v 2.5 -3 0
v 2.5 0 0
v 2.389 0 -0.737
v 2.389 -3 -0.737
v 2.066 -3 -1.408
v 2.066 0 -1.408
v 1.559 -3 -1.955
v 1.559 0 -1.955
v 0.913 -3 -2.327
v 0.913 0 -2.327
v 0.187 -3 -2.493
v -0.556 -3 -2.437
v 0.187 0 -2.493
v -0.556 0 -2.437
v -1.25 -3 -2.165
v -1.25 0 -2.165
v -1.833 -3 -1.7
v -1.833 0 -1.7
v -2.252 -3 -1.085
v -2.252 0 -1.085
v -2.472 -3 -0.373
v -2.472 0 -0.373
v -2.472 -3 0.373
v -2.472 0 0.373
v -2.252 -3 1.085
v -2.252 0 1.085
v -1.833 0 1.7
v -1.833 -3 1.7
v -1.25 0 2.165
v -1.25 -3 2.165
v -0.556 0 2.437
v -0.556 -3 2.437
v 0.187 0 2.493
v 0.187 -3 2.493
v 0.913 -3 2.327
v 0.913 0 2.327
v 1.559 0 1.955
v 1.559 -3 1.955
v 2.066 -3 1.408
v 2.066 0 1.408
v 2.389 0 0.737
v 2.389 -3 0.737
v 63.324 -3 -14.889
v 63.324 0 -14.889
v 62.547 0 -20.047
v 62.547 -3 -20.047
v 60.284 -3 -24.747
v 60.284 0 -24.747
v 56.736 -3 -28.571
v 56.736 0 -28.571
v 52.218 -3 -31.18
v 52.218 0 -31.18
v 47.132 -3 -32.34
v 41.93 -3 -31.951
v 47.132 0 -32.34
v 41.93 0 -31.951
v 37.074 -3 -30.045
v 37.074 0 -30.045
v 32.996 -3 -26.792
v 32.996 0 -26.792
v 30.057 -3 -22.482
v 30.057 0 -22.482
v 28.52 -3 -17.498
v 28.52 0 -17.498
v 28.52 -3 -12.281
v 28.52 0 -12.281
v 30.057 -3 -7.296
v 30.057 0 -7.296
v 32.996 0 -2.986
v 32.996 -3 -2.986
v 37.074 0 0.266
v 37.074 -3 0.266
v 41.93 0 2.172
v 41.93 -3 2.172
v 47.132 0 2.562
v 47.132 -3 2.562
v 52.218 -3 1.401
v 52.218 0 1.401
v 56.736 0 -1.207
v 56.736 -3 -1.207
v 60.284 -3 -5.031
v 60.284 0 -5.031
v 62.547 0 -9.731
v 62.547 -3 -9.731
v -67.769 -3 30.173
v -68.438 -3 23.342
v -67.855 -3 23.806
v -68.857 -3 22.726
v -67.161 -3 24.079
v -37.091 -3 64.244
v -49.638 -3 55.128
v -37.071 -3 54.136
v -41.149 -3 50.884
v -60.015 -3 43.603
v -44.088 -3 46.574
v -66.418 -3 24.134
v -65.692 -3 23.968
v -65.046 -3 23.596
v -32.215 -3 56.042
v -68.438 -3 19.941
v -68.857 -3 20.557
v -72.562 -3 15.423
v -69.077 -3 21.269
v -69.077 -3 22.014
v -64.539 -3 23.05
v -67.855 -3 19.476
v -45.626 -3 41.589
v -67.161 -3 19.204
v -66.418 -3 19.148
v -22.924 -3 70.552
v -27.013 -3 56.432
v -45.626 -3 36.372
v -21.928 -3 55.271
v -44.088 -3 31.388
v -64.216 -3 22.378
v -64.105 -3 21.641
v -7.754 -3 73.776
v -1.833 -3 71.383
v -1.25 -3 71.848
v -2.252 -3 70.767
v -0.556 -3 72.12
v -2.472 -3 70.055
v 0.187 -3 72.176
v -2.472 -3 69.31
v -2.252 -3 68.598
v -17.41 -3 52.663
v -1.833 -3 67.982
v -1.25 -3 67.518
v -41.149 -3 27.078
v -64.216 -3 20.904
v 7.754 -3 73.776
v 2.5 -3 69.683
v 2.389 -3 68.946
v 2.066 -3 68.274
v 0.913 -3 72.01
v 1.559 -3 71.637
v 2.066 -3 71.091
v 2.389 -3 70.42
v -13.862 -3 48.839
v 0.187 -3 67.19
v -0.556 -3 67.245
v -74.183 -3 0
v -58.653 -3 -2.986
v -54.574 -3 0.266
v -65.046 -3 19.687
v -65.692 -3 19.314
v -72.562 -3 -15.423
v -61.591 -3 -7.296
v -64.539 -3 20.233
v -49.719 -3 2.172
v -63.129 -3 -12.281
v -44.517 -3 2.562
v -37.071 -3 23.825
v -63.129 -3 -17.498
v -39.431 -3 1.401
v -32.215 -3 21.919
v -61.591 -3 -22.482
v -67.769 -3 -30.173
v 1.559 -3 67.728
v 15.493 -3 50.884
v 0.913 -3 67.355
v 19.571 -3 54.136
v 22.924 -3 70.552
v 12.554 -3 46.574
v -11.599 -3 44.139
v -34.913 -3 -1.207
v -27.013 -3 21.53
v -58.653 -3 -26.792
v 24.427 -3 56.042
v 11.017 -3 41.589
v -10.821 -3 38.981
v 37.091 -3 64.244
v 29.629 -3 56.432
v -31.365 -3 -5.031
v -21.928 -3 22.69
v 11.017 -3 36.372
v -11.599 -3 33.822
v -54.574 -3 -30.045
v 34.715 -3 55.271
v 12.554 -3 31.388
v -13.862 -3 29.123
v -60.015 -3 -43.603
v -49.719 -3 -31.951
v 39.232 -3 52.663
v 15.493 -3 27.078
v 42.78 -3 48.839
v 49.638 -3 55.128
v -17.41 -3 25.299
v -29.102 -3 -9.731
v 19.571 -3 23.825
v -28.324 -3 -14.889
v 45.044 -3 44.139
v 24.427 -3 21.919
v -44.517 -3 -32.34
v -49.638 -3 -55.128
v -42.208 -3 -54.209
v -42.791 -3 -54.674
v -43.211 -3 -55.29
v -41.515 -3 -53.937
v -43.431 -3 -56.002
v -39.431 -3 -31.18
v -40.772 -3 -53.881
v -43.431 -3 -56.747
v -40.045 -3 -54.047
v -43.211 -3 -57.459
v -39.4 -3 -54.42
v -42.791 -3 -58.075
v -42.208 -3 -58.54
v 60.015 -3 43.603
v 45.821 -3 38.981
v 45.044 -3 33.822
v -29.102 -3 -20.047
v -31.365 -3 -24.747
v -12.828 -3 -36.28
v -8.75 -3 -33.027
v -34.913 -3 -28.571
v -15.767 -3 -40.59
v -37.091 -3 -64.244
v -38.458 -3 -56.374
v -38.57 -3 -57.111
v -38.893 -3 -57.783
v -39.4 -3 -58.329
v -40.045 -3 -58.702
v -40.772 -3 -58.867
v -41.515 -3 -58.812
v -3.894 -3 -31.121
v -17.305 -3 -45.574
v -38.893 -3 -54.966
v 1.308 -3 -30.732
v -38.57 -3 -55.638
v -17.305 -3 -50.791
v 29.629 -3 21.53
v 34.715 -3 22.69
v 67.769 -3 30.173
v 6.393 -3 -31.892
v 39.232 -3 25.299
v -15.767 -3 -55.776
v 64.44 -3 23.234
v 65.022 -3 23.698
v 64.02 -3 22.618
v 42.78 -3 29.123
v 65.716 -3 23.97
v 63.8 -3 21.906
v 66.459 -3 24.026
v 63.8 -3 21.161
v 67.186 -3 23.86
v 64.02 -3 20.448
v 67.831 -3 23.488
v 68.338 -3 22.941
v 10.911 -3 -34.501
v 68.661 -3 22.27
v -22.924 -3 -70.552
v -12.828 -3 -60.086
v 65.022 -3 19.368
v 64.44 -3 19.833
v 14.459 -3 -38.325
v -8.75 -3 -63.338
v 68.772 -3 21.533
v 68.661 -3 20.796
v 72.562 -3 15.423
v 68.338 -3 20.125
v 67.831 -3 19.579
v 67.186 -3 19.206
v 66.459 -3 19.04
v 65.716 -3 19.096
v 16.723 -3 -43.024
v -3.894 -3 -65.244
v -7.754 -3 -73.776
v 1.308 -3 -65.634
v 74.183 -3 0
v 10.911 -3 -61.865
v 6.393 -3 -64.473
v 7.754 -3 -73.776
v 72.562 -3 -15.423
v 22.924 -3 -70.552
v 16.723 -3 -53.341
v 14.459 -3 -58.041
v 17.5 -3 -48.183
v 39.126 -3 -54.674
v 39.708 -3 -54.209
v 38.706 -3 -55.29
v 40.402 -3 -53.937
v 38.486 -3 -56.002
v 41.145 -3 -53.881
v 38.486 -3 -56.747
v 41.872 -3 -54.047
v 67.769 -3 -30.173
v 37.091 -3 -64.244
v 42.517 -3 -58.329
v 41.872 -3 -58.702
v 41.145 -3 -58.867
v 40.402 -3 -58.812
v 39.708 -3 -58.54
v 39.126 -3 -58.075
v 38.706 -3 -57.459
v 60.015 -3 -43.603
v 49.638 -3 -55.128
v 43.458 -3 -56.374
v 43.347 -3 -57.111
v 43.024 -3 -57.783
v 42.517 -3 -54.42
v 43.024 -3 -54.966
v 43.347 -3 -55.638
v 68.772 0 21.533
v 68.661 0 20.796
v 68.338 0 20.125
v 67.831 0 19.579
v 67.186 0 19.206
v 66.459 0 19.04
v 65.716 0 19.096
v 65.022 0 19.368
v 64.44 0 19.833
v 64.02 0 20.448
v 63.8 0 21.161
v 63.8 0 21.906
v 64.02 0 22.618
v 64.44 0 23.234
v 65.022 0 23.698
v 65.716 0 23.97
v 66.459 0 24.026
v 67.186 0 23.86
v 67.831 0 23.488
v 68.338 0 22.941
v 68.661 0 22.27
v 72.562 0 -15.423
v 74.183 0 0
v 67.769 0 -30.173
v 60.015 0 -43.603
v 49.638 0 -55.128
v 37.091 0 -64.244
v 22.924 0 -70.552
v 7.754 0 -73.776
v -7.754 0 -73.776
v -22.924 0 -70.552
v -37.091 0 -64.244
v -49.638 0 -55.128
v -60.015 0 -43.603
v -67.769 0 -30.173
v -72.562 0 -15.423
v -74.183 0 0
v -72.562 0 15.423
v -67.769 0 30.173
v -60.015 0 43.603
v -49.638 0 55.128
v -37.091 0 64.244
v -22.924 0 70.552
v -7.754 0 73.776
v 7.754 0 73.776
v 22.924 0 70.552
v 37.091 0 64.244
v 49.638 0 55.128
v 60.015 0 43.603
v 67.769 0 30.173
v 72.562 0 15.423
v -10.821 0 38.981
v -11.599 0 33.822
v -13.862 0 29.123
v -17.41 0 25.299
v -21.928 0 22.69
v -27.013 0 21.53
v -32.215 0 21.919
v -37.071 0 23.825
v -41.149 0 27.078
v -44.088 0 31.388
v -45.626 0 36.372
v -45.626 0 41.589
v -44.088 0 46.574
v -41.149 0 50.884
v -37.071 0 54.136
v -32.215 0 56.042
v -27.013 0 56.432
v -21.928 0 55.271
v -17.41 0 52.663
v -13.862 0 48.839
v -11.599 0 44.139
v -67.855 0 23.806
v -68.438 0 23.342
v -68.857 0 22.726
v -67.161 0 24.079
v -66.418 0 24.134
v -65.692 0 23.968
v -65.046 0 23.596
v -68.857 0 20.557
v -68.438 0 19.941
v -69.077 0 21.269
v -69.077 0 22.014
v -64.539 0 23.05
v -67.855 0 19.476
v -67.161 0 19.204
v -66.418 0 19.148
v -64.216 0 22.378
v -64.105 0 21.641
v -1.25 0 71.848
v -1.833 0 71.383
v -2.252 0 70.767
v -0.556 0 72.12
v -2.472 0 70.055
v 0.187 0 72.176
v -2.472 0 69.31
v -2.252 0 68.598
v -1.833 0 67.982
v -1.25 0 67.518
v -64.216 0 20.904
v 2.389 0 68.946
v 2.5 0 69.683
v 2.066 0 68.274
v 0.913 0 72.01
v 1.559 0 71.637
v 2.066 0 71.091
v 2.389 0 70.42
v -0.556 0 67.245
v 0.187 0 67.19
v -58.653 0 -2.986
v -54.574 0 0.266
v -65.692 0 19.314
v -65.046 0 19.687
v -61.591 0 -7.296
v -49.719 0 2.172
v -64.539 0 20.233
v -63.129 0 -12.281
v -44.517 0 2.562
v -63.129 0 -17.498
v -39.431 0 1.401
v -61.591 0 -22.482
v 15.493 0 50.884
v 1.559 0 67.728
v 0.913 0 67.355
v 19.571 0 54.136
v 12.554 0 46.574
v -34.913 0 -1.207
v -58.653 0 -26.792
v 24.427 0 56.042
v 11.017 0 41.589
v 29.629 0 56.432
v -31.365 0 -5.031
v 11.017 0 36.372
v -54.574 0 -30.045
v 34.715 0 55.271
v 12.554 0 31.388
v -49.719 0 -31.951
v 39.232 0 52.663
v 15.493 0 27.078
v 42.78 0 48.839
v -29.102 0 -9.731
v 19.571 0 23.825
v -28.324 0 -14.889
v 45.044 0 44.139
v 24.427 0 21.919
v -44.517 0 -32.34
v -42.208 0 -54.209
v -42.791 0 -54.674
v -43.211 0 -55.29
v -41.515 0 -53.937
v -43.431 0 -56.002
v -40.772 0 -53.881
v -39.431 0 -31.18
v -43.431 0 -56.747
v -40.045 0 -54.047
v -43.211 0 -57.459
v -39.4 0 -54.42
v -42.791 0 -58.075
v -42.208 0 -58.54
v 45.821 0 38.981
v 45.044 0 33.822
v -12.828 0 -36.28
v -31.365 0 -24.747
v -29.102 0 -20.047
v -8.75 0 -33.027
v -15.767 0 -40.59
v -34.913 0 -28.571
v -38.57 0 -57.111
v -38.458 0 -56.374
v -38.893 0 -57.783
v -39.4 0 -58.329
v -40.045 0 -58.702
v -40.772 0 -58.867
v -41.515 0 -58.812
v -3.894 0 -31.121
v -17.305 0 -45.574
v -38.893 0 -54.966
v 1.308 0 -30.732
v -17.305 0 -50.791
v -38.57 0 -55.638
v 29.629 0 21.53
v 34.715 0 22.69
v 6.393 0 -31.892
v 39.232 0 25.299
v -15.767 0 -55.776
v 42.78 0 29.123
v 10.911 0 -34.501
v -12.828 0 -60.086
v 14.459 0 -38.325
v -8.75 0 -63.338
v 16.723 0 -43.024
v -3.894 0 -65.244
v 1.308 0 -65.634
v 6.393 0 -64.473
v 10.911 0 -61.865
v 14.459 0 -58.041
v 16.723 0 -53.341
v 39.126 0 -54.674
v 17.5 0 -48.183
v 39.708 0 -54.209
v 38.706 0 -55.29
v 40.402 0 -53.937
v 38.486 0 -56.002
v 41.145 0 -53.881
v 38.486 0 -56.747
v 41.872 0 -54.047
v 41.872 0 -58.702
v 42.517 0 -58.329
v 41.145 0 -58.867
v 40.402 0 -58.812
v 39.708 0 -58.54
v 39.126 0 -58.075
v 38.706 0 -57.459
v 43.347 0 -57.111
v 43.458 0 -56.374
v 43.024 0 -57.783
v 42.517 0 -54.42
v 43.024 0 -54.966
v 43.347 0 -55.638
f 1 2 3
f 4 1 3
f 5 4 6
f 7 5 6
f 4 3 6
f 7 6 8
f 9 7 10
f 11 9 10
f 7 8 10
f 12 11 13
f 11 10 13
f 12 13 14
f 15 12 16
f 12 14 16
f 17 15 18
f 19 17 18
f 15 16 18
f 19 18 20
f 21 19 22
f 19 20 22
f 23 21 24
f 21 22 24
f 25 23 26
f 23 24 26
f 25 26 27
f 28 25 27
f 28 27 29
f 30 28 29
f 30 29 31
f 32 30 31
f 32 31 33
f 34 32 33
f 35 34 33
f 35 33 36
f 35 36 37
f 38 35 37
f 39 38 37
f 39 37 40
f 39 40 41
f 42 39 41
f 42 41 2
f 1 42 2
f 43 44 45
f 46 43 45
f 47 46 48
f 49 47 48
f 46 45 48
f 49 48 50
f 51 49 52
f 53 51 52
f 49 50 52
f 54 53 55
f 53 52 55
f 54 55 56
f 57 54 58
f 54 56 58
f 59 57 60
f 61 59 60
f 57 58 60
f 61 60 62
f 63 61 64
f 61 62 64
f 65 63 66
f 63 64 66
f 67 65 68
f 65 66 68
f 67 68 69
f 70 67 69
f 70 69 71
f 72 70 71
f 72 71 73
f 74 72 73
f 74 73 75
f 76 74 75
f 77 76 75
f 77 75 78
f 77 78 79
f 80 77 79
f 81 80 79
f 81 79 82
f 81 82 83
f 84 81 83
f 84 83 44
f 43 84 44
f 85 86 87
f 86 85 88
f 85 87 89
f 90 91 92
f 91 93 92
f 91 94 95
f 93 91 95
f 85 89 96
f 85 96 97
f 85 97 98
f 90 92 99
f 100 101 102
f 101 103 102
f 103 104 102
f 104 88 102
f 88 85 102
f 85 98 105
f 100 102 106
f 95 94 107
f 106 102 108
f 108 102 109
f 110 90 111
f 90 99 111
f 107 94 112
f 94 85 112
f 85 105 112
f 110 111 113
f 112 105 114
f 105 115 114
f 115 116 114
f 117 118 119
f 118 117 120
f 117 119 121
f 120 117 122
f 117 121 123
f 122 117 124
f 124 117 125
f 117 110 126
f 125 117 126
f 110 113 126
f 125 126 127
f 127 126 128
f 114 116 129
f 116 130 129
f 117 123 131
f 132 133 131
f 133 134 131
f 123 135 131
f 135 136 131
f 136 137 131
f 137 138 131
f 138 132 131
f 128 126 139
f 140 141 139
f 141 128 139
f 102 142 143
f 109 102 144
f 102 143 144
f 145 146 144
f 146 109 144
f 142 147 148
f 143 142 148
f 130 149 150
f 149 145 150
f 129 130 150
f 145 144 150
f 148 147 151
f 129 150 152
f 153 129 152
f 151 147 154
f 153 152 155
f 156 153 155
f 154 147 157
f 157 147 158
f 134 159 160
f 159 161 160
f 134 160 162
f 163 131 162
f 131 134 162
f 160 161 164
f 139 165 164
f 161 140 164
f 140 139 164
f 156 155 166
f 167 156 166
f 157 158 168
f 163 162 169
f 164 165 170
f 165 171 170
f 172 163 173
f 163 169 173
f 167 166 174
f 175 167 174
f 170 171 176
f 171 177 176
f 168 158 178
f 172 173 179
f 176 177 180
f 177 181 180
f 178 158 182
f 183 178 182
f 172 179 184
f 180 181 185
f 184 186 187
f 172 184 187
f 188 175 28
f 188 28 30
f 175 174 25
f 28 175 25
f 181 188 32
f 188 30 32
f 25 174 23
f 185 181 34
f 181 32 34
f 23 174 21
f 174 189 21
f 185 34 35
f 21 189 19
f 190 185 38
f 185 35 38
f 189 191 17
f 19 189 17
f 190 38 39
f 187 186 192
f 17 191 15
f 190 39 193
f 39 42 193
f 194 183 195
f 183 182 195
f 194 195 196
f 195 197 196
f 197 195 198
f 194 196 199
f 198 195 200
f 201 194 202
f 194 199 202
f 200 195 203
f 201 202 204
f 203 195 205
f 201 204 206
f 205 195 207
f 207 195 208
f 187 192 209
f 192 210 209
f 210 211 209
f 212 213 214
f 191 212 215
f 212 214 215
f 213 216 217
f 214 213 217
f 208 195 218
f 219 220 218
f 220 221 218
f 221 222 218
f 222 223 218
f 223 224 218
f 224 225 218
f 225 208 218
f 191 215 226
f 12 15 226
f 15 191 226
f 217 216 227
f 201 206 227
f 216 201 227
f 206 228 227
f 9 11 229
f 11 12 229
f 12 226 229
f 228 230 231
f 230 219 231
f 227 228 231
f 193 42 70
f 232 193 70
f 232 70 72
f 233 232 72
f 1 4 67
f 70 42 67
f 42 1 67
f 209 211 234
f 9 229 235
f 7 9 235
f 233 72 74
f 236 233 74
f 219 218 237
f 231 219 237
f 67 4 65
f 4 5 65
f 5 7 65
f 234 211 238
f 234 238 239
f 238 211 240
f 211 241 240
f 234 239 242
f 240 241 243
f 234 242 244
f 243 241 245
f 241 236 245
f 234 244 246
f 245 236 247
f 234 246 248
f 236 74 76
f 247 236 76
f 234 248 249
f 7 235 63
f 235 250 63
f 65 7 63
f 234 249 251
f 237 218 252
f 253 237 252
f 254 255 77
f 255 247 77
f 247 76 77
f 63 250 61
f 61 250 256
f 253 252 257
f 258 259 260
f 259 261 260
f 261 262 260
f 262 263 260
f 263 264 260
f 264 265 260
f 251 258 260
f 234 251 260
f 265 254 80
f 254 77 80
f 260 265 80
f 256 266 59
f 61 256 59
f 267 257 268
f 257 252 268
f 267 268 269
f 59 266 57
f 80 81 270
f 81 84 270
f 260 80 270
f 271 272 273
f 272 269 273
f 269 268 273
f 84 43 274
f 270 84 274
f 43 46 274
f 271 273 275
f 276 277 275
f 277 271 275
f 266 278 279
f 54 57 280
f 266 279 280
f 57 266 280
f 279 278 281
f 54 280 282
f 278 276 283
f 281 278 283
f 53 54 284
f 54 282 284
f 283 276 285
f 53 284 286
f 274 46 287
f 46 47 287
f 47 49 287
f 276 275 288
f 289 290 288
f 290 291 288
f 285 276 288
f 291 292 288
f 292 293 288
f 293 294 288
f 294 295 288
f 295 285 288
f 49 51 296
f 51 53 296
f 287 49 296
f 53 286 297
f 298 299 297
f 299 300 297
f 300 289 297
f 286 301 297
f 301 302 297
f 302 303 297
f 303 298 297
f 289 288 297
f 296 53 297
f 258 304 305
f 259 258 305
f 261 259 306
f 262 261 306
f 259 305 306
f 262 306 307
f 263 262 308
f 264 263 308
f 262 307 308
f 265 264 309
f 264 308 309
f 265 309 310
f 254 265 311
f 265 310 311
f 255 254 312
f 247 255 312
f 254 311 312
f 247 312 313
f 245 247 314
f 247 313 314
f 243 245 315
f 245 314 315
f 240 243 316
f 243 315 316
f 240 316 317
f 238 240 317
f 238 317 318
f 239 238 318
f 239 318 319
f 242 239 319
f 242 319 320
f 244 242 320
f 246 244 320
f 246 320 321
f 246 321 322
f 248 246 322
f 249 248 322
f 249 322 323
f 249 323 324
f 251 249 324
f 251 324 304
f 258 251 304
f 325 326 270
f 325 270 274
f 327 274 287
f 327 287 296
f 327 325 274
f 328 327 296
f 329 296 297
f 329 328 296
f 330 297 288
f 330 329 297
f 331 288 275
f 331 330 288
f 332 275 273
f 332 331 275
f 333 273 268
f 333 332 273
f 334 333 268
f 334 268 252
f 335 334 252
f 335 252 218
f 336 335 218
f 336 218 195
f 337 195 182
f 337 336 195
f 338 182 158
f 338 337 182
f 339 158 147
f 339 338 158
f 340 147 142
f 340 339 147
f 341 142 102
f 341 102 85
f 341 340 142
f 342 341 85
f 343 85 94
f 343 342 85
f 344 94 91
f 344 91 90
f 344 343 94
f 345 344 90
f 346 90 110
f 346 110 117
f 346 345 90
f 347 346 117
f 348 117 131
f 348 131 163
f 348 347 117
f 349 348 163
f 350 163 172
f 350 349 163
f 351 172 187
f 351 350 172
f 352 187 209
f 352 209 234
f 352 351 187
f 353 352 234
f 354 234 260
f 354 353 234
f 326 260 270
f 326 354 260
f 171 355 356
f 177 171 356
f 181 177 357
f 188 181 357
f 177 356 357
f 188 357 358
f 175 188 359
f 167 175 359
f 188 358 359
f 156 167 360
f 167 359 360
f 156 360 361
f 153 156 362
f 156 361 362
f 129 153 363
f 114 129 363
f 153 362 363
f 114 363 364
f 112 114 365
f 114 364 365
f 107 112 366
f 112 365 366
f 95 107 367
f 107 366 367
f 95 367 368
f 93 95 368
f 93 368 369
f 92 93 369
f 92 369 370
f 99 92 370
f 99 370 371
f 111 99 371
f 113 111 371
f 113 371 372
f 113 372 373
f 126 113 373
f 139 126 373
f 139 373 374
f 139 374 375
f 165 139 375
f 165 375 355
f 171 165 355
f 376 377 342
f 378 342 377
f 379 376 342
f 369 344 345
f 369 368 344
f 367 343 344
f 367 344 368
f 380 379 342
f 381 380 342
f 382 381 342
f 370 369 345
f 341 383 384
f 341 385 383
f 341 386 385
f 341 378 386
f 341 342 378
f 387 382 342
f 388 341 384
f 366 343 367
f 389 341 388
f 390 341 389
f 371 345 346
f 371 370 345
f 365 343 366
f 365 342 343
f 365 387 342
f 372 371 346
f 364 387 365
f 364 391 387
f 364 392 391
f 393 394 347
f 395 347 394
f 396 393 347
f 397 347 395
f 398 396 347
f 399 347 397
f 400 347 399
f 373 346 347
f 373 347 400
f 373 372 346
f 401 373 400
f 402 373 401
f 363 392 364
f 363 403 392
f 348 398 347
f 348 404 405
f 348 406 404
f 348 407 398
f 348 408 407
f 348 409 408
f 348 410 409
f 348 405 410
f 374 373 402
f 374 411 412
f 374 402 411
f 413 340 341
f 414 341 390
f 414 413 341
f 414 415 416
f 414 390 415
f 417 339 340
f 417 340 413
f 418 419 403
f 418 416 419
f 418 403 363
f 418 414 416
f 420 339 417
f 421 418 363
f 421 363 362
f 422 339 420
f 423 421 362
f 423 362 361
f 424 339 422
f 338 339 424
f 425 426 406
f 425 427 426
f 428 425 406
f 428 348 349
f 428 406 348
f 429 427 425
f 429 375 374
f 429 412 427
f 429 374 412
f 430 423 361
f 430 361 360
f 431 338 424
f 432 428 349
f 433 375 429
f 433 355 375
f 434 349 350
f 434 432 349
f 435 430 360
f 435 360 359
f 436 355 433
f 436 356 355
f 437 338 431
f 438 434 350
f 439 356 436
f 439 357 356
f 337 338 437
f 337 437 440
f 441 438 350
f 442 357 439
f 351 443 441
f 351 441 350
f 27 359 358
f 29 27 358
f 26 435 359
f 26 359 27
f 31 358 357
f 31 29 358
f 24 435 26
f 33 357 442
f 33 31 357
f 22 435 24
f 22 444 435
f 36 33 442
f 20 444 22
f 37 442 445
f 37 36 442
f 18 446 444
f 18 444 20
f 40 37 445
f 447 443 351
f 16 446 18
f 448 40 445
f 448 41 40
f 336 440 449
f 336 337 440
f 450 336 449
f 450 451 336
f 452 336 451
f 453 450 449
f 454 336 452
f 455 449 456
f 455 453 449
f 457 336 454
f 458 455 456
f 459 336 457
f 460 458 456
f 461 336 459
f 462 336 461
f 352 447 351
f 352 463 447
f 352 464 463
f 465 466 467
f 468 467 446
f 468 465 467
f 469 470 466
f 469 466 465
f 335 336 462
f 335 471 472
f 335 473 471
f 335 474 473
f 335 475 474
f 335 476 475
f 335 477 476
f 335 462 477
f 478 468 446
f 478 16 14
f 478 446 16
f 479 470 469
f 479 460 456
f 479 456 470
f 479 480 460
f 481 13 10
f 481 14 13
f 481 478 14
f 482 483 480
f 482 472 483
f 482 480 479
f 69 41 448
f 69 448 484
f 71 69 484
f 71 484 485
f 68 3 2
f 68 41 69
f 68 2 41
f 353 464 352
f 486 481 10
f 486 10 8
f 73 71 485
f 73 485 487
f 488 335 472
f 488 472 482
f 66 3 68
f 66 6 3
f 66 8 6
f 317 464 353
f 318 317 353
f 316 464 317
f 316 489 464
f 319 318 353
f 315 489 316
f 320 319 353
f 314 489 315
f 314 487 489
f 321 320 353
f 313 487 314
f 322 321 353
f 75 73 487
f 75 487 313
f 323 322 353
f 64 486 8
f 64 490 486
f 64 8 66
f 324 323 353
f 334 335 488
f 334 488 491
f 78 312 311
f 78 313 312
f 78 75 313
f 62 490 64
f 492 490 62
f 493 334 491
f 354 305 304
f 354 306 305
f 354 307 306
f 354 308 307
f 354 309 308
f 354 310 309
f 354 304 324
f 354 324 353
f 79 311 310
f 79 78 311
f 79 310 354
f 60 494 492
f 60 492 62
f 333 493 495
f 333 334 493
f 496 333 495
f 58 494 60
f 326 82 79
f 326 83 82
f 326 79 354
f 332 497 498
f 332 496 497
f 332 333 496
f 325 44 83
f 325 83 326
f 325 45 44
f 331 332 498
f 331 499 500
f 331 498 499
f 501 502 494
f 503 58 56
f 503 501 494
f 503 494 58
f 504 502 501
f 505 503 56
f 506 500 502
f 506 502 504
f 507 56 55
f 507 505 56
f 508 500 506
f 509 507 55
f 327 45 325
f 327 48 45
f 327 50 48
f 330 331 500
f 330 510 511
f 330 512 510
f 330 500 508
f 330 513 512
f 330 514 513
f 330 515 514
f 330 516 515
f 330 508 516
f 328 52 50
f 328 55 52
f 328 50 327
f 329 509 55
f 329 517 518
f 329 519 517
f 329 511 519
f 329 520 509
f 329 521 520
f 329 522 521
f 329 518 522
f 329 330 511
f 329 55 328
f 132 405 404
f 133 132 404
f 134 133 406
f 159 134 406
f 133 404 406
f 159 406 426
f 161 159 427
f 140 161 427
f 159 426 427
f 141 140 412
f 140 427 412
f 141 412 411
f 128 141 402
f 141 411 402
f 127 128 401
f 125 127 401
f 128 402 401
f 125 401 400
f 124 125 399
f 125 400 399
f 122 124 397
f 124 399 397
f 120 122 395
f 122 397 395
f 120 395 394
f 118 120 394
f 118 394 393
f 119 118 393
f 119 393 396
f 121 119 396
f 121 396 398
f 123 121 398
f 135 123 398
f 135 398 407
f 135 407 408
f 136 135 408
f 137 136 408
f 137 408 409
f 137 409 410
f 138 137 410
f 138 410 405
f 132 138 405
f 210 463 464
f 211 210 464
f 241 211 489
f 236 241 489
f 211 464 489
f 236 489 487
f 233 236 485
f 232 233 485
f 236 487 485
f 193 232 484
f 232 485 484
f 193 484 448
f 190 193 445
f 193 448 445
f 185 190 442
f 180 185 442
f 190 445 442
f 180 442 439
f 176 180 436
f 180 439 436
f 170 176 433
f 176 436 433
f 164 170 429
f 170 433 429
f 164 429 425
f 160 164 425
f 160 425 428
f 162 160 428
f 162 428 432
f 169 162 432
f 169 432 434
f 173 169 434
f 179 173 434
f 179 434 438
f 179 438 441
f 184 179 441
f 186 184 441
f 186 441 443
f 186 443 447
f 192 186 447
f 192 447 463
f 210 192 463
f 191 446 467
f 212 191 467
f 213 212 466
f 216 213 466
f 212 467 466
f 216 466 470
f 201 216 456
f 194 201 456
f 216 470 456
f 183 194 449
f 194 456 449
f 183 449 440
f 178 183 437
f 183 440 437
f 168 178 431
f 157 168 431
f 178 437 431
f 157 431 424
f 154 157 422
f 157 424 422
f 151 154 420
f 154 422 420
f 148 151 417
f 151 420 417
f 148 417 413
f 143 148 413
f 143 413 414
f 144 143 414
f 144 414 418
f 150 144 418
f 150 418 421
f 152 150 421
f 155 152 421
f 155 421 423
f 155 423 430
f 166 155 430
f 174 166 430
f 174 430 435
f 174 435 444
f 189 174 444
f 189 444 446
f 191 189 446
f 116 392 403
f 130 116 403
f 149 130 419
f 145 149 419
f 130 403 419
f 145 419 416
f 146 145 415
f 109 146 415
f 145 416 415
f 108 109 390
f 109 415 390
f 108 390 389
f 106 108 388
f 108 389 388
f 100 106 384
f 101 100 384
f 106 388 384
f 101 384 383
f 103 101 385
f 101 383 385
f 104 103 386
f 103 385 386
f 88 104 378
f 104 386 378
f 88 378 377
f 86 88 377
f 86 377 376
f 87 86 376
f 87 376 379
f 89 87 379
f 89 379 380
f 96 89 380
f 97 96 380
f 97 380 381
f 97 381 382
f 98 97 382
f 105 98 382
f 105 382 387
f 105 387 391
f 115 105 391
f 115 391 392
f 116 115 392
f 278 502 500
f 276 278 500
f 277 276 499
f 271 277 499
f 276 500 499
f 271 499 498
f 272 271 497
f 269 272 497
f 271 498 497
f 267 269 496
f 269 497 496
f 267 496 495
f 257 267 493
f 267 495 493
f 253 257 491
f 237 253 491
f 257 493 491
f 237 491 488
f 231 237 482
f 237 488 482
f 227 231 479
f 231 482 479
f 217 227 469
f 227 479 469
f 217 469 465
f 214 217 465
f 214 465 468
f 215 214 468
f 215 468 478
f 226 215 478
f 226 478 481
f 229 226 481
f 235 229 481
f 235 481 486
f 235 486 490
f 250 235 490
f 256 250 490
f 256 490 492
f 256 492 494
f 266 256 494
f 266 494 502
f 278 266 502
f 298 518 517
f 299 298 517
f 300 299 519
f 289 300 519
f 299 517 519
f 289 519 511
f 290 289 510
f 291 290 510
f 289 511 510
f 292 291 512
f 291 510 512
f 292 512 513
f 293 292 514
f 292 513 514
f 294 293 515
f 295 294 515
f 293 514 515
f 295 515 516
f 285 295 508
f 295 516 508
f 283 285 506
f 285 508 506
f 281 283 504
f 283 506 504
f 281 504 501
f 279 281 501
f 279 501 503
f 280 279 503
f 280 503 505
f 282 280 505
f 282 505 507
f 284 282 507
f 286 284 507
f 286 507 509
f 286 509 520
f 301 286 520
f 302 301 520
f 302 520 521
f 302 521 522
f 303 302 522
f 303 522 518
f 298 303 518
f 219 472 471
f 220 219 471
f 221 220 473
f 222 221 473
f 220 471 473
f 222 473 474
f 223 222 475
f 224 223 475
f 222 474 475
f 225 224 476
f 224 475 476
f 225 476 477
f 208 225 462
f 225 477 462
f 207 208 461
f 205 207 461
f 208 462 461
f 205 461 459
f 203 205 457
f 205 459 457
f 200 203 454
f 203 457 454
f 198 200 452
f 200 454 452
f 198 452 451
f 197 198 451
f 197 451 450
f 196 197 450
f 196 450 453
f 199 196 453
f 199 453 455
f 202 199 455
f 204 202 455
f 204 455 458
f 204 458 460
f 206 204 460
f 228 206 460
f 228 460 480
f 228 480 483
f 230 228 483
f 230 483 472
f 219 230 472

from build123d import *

# Parameters (mm, degrees)
SKETCH1_R           = 74.18267629
BOSS_EXTRUDE2_DEPTH = 3
SKETCH1_4_R         = 17.5
CUT_EXTRUDE1_DEPTH  = 4
SKETCH1_5_R         = 2.5
CUT_EXTRUDE2_DEPTH  = 4
SKETCH1_10_R        = 2.5
CUT_EXTRUDE5_DEPTH  = 10


with BuildPart() as part:
    # Sketch1 → Boss-Extrude2 (new body)
    with BuildSketch(Plane(origin=(0, 0, 0), x_dir=(1, 0, 0), z_dir=(0, 1, 0))):
        Circle(SKETCH1_R)
    extrude(amount=-BOSS_EXTRUDE2_DEPTH)

    # Sketch1<4> → Cut-Extrude1 (cut)
    with BuildSketch(Plane(origin=(0, 0, 0), x_dir=(1, 0, 0), z_dir=(0, 1, 0))):
        with Locations((0, 48.18267629)):
            Circle(SKETCH1_4_R)
        with Locations((45.824448258, 14.889265808)):
            Circle(SKETCH1_4_R)
        with Locations((28.321066539, -38.980603953)):
            Circle(SKETCH1_4_R)
        with Locations((-28.321066539, -38.980603953)):
            Circle(SKETCH1_4_R)
        with Locations((-45.824448258, 14.889265808)):
            Circle(SKETCH1_4_R)
    extrude(amount=-CUT_EXTRUDE1_DEPTH, mode=Mode.SUBTRACT)

    # Sketch1<5> → Cut-Extrude2 (cut)
    with BuildSketch(Plane(origin=(0, 0, 0), x_dir=(1, 0, 0), z_dir=(0, 1, 0))):
        with Locations((40.958449464, 56.374469332)):
            Circle(SKETCH1_5_R)
        with Locations((66.272163358, -21.533131187)):
            Circle(SKETCH1_5_R)
        with Locations((0, -69.68267629)):
            Circle(SKETCH1_5_R)
        with Locations((-66.605033139, -21.641287135)):
            Circle(SKETCH1_5_R)
        with Locations((-40.958449464, 56.374469332)):
            Circle(SKETCH1_5_R)
    extrude(amount=-CUT_EXTRUDE2_DEPTH, mode=Mode.SUBTRACT)

    # Sketch1<10> → Cut-Extrude5 (cut)
    with BuildSketch(Plane(origin=(0, 0, 0), x_dir=(1, 0, 0), z_dir=(0, 1, 0))):
        Circle(SKETCH1_10_R)
    extrude(amount=-CUT_EXTRUDE5_DEPTH, mode=Mode.SUBTRACT)


solid = part.part
